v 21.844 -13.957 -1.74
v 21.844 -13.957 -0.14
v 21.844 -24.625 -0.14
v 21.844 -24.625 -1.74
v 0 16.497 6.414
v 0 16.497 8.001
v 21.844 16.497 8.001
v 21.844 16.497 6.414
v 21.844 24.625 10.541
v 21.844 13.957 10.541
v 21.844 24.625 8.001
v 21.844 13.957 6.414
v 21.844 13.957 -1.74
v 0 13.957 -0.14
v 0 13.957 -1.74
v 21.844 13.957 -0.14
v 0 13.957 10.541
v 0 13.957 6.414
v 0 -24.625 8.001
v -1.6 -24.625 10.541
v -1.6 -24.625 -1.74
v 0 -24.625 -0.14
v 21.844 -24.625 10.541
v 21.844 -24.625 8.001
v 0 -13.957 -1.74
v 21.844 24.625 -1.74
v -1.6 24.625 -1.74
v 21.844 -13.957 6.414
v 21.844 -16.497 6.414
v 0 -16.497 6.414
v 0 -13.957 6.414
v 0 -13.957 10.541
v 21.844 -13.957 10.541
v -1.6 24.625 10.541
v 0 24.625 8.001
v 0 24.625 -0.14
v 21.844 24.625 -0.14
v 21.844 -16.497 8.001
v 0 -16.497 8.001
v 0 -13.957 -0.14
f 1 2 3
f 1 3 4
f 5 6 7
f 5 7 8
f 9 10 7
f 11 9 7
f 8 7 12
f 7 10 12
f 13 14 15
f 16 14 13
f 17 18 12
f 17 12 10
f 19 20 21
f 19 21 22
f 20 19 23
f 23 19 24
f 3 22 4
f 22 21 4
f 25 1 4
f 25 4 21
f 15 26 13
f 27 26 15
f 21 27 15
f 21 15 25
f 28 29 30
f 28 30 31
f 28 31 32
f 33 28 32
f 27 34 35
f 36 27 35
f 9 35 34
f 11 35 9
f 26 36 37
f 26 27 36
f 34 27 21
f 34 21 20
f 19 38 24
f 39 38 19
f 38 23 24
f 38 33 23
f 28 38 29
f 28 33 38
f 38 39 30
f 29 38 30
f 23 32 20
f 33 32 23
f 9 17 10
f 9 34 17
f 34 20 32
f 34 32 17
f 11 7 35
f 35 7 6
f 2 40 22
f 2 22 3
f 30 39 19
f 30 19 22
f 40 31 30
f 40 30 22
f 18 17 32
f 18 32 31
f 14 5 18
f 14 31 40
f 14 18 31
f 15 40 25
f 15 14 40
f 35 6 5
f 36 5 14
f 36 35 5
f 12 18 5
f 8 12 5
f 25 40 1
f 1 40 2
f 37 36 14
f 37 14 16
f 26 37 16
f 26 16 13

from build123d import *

# Parameters (mm, degrees)
BOSS_EXTRUDE2_DEPTH   = 21.844
BOSS_EXTRUDE2_2_DEPTH = 21.844
SKETCH3_W             = 4.1275
SKETCH3_H             = 39.7002
BOSS_EXTRUDE3_DEPTH   = 1.6002
SKETCH4_W             = 1.6002
SKETCH4_H             = 39.7002
BOSS_EXTRUDE4_DEPTH   = 6.5532
SKETCH5_W             = 23.4442
SKETCH5_H             = 39.7002
BOSS_EXTRUDE5_DEPTH   = 1.6002
BOSS_EXTRUDE6_DEPTH   = 4.7752
SKETCH7_W             = 21.844
SKETCH7_H             = 27.9146
CUT_EXTRUDE1_DEPTH    = 6.35


with BuildPart() as part:
    # Sketch2 → Boss-Extrude2 (new body)
    with BuildSketch(Plane(origin=(0, 0, 0), x_dir=(0, 0, -1), z_dir=(1, 0, 0))):
        Polygon((-8.001, 19.8501), (-8.001, 16.4973), (-6.4135, 16.4973), (-6.4135, 13.9573), (-10.541, 13.9573), (-10.541, 19.8501), align=None)
    extrude(amount=BOSS_EXTRUDE2_DEPTH)



with BuildPart() as body_2:
    # Sketch2 → Boss-Extrude2 2 (new body)
    with BuildSketch(Plane(origin=(0, 0, 0), x_dir=(0, 0, -1), z_dir=(1, 0, 0))):
        Polygon((-6.4135, -16.4973), (-6.4135, -13.9573), (-10.541, -13.9573), (-10.541, -19.8501), (-8.001, -19.8501), (-8.001, -16.4973), align=None)
    extrude(amount=BOSS_EXTRUDE2_2_DEPTH)


with BuildPart() as part_1:
    add(part.part)

    add(body_2.part)  # Boss-Extrude3 merges body 2
    # Sketch3 → Boss-Extrude3 (add)
    with BuildSketch(Plane.ZY):
        with Locations((8.47725, 0)):
            Rectangle(SKETCH3_W, SKETCH3_H)
    extrude(amount=BOSS_EXTRUDE3_DEPTH)

    # Sketch4 → Boss-Extrude4 (add)
    with BuildSketch(Plane(origin=(0, 0, 6.4135), x_dir=(-1, 0, 0), z_dir=(0, 0, -1))):
        with Locations((0.8001, 0)):
            Rectangle(SKETCH4_W, SKETCH4_H)
    extrude(amount=BOSS_EXTRUDE4_DEPTH)

    # Sketch5 → Boss-Extrude5 (add)
    with BuildSketch(Plane(origin=(0, 0, -0.1397), x_dir=(-1, 0, 0), z_dir=(0, 0, -1))):
        with Locations((-10.1219, 0)):
            Rectangle(SKETCH5_W, SKETCH5_H)
    extrude(amount=BOSS_EXTRUDE5_DEPTH)

    # Sketch6 → Boss-Extrude6 (add)
    with BuildSketch(Plane(origin=(0, 19.8501, 0), x_dir=(1, 0, 0), z_dir=(0, 1, 0))):
        Polygon((21.844, -8.001), (0, -8.001), (0, 0.1397), (21.844, 0.1397), (21.844, 1.7399), (-1.6002, 1.7399), (-1.6002, -10.541), (21.844, -10.541), align=None)
    boss_extrude6 = extrude(amount=BOSS_EXTRUDE6_DEPTH)

    # Mirror1: Boss-Extrude6 across plane
    add(boss_extrude6.mirror(Plane.ZX))

    # Sketch7 → Cut-Extrude1 (cut)
    with BuildSketch(Plane.XY.offset(-0.1397)):
        with Locations((10.922, 0)):
            Rectangle(SKETCH7_W, SKETCH7_H)
    extrude(amount=-CUT_EXTRUDE1_DEPTH, mode=Mode.SUBTRACT)


solid = part_1.part
